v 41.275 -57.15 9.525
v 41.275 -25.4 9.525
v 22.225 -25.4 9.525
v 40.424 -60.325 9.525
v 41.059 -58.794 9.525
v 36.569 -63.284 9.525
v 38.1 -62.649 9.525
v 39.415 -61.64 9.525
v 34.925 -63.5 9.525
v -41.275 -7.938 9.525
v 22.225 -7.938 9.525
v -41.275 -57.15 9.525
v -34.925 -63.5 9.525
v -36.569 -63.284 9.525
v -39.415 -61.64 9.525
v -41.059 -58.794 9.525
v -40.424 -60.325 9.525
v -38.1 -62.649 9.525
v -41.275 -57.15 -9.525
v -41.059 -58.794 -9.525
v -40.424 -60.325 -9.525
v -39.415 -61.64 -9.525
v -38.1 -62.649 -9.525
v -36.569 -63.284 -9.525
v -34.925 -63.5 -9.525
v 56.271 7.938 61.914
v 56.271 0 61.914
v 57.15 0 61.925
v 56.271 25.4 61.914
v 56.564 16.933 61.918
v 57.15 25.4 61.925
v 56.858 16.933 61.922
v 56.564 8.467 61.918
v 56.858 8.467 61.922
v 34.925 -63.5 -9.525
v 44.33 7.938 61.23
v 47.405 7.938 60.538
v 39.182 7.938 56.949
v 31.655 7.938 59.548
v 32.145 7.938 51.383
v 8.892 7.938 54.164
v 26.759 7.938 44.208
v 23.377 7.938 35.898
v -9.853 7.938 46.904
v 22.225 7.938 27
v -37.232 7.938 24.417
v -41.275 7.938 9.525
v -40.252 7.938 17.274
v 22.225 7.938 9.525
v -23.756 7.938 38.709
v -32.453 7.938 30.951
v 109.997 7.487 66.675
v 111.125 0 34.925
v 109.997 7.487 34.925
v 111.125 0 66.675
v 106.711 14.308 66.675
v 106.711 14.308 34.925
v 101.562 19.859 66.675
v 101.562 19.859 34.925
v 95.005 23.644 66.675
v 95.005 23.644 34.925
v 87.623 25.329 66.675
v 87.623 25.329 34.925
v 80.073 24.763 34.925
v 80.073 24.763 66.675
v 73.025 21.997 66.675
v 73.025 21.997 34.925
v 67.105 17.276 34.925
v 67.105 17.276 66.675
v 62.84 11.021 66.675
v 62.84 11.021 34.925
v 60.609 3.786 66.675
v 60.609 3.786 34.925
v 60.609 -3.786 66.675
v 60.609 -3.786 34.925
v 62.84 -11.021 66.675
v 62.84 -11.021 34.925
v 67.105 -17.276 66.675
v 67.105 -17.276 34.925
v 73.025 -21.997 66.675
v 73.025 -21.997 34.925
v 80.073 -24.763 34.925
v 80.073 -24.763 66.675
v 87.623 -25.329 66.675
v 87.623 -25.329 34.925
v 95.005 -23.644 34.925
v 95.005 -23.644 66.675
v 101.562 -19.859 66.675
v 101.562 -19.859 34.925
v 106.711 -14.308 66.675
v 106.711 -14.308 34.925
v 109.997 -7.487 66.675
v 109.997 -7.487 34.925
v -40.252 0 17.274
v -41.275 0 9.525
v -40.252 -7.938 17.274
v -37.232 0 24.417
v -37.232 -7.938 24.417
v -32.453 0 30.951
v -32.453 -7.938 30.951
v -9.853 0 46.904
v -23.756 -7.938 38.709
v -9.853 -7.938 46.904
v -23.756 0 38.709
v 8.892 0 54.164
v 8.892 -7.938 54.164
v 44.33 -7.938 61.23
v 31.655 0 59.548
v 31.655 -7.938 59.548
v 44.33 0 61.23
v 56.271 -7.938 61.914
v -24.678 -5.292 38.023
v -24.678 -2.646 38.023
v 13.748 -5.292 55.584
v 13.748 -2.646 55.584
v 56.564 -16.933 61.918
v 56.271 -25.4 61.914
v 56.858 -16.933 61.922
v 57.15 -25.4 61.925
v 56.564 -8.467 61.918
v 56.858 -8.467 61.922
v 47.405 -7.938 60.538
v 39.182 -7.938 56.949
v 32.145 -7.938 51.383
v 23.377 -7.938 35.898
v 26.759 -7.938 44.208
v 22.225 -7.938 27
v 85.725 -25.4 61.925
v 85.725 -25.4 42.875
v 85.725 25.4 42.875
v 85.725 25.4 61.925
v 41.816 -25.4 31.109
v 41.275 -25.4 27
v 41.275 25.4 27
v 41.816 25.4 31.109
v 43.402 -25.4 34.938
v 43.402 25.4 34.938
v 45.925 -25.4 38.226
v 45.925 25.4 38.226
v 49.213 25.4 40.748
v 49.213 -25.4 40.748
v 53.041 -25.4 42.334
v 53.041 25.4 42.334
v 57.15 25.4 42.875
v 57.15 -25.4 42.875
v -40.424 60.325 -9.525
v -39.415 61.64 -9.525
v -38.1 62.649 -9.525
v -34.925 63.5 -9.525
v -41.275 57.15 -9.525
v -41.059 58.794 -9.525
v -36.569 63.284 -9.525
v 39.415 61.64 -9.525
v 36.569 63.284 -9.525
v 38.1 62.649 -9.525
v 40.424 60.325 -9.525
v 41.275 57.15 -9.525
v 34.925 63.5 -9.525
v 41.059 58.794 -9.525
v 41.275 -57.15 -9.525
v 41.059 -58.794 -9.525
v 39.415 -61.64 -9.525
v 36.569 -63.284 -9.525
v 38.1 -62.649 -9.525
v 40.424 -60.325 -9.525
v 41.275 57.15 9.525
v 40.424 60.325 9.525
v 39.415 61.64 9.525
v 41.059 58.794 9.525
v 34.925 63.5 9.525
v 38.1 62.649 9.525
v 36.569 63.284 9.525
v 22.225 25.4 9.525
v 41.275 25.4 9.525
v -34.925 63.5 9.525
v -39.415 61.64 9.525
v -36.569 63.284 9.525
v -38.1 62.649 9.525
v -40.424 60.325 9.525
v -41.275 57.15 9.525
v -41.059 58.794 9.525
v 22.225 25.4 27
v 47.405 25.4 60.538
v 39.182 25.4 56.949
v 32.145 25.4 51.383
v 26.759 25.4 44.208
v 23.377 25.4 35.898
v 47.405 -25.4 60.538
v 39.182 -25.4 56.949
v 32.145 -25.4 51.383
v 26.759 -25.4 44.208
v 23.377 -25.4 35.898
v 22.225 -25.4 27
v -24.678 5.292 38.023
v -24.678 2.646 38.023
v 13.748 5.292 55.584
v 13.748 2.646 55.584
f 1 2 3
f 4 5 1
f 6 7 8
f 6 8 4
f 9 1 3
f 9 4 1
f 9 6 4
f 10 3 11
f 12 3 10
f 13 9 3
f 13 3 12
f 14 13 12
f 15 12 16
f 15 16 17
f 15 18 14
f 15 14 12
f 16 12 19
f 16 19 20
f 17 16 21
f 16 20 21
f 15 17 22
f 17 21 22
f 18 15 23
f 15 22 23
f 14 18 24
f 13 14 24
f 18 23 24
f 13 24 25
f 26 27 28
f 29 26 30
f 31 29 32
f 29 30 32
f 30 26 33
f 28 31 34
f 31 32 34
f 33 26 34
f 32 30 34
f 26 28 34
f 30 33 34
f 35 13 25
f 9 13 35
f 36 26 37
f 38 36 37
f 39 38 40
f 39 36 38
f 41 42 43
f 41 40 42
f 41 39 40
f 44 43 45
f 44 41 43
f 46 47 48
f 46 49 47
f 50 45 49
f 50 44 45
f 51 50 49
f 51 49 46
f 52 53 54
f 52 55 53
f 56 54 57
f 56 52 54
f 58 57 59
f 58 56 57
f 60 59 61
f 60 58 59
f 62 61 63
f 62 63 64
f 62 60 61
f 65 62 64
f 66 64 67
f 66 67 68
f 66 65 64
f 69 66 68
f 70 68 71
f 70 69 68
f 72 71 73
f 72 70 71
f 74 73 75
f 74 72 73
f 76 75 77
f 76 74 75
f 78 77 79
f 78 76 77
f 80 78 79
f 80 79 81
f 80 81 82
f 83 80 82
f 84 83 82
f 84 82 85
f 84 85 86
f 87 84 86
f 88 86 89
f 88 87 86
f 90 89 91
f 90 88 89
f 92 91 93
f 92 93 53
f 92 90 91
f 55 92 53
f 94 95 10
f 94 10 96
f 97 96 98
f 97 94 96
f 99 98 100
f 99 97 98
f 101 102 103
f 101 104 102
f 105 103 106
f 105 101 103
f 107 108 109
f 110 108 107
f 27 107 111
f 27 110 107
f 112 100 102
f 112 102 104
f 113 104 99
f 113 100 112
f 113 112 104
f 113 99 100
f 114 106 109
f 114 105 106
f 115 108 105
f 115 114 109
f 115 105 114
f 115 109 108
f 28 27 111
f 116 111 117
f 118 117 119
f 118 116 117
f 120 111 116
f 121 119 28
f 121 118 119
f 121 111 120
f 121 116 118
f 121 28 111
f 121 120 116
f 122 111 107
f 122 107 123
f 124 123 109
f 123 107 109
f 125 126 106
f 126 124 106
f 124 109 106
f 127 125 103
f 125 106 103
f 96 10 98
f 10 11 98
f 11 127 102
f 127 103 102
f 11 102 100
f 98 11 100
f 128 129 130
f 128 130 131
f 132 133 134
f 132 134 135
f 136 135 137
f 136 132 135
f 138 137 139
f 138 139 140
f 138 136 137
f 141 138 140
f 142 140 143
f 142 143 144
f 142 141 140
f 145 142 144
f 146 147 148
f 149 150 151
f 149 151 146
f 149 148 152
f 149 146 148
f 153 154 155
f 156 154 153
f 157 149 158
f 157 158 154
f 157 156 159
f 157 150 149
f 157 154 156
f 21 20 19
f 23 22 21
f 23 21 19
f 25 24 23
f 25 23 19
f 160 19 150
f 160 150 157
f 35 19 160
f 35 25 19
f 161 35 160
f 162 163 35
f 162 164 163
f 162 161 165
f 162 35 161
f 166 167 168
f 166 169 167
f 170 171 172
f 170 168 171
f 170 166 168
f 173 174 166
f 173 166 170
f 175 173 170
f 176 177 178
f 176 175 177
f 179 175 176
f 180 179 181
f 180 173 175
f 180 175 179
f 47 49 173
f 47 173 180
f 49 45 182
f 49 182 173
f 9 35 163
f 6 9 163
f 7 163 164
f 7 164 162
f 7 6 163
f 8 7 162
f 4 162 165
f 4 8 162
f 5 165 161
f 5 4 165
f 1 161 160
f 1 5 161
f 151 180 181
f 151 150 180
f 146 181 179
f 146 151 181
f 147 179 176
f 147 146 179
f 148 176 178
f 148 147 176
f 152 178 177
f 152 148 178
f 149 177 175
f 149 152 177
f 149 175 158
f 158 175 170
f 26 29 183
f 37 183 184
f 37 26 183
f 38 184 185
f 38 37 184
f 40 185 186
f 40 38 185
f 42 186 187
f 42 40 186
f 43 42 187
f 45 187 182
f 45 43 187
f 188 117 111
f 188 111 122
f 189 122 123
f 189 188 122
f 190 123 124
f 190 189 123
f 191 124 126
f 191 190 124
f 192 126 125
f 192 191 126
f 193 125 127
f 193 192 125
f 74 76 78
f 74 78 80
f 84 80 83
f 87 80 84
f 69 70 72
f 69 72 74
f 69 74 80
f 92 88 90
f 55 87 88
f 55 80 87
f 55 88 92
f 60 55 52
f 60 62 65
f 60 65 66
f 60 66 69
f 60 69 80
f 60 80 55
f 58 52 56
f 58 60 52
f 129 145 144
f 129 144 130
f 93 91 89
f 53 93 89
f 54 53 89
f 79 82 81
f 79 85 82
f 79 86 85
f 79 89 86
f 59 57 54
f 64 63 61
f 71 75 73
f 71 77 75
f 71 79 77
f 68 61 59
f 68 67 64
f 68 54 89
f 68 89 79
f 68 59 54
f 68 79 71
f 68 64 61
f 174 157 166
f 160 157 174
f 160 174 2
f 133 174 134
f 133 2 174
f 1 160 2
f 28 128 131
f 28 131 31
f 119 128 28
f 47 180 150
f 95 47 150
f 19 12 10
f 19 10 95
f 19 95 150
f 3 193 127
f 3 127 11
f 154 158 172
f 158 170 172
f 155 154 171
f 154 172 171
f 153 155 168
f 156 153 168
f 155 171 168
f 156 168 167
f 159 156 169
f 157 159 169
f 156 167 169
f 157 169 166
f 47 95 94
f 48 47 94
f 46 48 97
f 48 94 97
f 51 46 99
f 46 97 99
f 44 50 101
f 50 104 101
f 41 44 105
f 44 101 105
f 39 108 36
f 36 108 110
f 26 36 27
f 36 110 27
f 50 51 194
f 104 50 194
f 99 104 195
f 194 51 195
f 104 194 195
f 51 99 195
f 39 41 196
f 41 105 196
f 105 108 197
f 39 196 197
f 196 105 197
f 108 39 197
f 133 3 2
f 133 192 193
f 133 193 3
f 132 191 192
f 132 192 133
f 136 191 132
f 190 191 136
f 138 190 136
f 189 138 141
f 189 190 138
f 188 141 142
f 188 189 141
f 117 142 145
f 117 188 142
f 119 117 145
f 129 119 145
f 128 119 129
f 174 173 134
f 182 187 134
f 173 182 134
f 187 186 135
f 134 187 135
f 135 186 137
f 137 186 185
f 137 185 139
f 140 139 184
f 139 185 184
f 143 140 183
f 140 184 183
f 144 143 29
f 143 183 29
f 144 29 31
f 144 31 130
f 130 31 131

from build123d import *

# Parameters (mm, degrees)
F1_DEPTH = 63.5
F0_W     = 25.4
F0_H     = 19.05
F2_DEPTH = 25.4
F3_DEPTH = 7.9375
F5_R     = 6.35


with BuildPart() as f1:
    # F0 (on Front) → F1 (new body, symmetric)
    with BuildSketch(Plane.XZ):
        Polygon((-41.275, 9.525), (-41.275, -9.525), (41.275, -9.525), (41.275, 9.525), (22.225, 9.525), align=None)
    extrude(amount=F1_DEPTH, both=True)

    # F0 (on Front) → F2 (join, symmetric)
    with BuildSketch(Plane.XZ):
        with BuildLine():
            Line((22.225, 9.525), (41.275, 9.525))
            Line((41.275, 9.525), (41.275, 27.0002))
            ThreePointArc((41.275, 27.0002), (45.9246798487, 38.2255201513), (57.15, 42.8752))
            Line((57.15, 42.8752), (60.325, 42.8752))
            Line((60.325, 42.8752), (60.325, 61.9252))
            Line((60.325, 61.9252), (57.15, 61.9252))
            add(Edge.make_bspline(
                [(56.2705114217, 61.9141245122), (56.5648721965, 61.9188188137), (56.8580468, 61.9225108373), (57.15, 61.9252)],
                knots=[110.661908676, 110.661908676, 110.661908676, 110.661908676, 111.5045361635, 111.5045361635, 111.5045361635, 111.5045361635], degree=3))
            ThreePointArc((56.2705114217, 61.9141245122), (32.1452828091, 51.3829755434), (22.225, 27.0002))
            Line((22.225, 27.0002), (22.225, 9.525))
        make_face()
        with Locations((73.025, 52.4002)):
            Rectangle(F0_W, F0_H)
    extrude(amount=F2_DEPTH, both=True)

    # F0 (on Front) → F3 (join, symmetric)
    with BuildSketch(Plane.XZ):
        with BuildLine():
            add(Edge.make_bspline(
                [(-41.275, 9.525), (-41.504476051, 43.3943776693), (17.612236377, 61.2976238893), (56.2705114217, 61.9141245122)],
                knots=[0, 0, 0, 0, 110.661908676, 110.661908676, 110.661908676, 110.661908676], degree=3))
            Line((-41.275, 9.525), (22.225, 9.525))
            Line((22.225, 9.525), (22.225, 27.0002))
            ThreePointArc((22.225, 27.0002), (32.1452828091, 51.3829755434), (56.2705114217, 61.9141245122))
        make_face()
    extrude(amount=F3_DEPTH, both=True)

    # F5
    f5_edges = [f1.edges().sort_by_distance(p)[0] for p in [
        (-41.275, -63.5, 0),
        (41.275, -63.5, 0),
        (41.275, 63.5, 0),
        (-41.275, 63.5, 0),
    ]]
    fillet(f5_edges, radius=F5_R)


with BuildPart() as f4:
    # F0 (on Front) → F4 (revolve)
    with BuildSketch(Plane.XZ):
        Polygon((85.725, 66.675), (85.725, 61.9252), (85.725, 42.8752), (85.725, 34.925), (111.125, 34.925), (111.125, 66.675), align=None)
    revolve(axis=Axis((85.725, 0, 50.8), (0, 0, 1)))


solid = Compound([f1.part, f4.part])
